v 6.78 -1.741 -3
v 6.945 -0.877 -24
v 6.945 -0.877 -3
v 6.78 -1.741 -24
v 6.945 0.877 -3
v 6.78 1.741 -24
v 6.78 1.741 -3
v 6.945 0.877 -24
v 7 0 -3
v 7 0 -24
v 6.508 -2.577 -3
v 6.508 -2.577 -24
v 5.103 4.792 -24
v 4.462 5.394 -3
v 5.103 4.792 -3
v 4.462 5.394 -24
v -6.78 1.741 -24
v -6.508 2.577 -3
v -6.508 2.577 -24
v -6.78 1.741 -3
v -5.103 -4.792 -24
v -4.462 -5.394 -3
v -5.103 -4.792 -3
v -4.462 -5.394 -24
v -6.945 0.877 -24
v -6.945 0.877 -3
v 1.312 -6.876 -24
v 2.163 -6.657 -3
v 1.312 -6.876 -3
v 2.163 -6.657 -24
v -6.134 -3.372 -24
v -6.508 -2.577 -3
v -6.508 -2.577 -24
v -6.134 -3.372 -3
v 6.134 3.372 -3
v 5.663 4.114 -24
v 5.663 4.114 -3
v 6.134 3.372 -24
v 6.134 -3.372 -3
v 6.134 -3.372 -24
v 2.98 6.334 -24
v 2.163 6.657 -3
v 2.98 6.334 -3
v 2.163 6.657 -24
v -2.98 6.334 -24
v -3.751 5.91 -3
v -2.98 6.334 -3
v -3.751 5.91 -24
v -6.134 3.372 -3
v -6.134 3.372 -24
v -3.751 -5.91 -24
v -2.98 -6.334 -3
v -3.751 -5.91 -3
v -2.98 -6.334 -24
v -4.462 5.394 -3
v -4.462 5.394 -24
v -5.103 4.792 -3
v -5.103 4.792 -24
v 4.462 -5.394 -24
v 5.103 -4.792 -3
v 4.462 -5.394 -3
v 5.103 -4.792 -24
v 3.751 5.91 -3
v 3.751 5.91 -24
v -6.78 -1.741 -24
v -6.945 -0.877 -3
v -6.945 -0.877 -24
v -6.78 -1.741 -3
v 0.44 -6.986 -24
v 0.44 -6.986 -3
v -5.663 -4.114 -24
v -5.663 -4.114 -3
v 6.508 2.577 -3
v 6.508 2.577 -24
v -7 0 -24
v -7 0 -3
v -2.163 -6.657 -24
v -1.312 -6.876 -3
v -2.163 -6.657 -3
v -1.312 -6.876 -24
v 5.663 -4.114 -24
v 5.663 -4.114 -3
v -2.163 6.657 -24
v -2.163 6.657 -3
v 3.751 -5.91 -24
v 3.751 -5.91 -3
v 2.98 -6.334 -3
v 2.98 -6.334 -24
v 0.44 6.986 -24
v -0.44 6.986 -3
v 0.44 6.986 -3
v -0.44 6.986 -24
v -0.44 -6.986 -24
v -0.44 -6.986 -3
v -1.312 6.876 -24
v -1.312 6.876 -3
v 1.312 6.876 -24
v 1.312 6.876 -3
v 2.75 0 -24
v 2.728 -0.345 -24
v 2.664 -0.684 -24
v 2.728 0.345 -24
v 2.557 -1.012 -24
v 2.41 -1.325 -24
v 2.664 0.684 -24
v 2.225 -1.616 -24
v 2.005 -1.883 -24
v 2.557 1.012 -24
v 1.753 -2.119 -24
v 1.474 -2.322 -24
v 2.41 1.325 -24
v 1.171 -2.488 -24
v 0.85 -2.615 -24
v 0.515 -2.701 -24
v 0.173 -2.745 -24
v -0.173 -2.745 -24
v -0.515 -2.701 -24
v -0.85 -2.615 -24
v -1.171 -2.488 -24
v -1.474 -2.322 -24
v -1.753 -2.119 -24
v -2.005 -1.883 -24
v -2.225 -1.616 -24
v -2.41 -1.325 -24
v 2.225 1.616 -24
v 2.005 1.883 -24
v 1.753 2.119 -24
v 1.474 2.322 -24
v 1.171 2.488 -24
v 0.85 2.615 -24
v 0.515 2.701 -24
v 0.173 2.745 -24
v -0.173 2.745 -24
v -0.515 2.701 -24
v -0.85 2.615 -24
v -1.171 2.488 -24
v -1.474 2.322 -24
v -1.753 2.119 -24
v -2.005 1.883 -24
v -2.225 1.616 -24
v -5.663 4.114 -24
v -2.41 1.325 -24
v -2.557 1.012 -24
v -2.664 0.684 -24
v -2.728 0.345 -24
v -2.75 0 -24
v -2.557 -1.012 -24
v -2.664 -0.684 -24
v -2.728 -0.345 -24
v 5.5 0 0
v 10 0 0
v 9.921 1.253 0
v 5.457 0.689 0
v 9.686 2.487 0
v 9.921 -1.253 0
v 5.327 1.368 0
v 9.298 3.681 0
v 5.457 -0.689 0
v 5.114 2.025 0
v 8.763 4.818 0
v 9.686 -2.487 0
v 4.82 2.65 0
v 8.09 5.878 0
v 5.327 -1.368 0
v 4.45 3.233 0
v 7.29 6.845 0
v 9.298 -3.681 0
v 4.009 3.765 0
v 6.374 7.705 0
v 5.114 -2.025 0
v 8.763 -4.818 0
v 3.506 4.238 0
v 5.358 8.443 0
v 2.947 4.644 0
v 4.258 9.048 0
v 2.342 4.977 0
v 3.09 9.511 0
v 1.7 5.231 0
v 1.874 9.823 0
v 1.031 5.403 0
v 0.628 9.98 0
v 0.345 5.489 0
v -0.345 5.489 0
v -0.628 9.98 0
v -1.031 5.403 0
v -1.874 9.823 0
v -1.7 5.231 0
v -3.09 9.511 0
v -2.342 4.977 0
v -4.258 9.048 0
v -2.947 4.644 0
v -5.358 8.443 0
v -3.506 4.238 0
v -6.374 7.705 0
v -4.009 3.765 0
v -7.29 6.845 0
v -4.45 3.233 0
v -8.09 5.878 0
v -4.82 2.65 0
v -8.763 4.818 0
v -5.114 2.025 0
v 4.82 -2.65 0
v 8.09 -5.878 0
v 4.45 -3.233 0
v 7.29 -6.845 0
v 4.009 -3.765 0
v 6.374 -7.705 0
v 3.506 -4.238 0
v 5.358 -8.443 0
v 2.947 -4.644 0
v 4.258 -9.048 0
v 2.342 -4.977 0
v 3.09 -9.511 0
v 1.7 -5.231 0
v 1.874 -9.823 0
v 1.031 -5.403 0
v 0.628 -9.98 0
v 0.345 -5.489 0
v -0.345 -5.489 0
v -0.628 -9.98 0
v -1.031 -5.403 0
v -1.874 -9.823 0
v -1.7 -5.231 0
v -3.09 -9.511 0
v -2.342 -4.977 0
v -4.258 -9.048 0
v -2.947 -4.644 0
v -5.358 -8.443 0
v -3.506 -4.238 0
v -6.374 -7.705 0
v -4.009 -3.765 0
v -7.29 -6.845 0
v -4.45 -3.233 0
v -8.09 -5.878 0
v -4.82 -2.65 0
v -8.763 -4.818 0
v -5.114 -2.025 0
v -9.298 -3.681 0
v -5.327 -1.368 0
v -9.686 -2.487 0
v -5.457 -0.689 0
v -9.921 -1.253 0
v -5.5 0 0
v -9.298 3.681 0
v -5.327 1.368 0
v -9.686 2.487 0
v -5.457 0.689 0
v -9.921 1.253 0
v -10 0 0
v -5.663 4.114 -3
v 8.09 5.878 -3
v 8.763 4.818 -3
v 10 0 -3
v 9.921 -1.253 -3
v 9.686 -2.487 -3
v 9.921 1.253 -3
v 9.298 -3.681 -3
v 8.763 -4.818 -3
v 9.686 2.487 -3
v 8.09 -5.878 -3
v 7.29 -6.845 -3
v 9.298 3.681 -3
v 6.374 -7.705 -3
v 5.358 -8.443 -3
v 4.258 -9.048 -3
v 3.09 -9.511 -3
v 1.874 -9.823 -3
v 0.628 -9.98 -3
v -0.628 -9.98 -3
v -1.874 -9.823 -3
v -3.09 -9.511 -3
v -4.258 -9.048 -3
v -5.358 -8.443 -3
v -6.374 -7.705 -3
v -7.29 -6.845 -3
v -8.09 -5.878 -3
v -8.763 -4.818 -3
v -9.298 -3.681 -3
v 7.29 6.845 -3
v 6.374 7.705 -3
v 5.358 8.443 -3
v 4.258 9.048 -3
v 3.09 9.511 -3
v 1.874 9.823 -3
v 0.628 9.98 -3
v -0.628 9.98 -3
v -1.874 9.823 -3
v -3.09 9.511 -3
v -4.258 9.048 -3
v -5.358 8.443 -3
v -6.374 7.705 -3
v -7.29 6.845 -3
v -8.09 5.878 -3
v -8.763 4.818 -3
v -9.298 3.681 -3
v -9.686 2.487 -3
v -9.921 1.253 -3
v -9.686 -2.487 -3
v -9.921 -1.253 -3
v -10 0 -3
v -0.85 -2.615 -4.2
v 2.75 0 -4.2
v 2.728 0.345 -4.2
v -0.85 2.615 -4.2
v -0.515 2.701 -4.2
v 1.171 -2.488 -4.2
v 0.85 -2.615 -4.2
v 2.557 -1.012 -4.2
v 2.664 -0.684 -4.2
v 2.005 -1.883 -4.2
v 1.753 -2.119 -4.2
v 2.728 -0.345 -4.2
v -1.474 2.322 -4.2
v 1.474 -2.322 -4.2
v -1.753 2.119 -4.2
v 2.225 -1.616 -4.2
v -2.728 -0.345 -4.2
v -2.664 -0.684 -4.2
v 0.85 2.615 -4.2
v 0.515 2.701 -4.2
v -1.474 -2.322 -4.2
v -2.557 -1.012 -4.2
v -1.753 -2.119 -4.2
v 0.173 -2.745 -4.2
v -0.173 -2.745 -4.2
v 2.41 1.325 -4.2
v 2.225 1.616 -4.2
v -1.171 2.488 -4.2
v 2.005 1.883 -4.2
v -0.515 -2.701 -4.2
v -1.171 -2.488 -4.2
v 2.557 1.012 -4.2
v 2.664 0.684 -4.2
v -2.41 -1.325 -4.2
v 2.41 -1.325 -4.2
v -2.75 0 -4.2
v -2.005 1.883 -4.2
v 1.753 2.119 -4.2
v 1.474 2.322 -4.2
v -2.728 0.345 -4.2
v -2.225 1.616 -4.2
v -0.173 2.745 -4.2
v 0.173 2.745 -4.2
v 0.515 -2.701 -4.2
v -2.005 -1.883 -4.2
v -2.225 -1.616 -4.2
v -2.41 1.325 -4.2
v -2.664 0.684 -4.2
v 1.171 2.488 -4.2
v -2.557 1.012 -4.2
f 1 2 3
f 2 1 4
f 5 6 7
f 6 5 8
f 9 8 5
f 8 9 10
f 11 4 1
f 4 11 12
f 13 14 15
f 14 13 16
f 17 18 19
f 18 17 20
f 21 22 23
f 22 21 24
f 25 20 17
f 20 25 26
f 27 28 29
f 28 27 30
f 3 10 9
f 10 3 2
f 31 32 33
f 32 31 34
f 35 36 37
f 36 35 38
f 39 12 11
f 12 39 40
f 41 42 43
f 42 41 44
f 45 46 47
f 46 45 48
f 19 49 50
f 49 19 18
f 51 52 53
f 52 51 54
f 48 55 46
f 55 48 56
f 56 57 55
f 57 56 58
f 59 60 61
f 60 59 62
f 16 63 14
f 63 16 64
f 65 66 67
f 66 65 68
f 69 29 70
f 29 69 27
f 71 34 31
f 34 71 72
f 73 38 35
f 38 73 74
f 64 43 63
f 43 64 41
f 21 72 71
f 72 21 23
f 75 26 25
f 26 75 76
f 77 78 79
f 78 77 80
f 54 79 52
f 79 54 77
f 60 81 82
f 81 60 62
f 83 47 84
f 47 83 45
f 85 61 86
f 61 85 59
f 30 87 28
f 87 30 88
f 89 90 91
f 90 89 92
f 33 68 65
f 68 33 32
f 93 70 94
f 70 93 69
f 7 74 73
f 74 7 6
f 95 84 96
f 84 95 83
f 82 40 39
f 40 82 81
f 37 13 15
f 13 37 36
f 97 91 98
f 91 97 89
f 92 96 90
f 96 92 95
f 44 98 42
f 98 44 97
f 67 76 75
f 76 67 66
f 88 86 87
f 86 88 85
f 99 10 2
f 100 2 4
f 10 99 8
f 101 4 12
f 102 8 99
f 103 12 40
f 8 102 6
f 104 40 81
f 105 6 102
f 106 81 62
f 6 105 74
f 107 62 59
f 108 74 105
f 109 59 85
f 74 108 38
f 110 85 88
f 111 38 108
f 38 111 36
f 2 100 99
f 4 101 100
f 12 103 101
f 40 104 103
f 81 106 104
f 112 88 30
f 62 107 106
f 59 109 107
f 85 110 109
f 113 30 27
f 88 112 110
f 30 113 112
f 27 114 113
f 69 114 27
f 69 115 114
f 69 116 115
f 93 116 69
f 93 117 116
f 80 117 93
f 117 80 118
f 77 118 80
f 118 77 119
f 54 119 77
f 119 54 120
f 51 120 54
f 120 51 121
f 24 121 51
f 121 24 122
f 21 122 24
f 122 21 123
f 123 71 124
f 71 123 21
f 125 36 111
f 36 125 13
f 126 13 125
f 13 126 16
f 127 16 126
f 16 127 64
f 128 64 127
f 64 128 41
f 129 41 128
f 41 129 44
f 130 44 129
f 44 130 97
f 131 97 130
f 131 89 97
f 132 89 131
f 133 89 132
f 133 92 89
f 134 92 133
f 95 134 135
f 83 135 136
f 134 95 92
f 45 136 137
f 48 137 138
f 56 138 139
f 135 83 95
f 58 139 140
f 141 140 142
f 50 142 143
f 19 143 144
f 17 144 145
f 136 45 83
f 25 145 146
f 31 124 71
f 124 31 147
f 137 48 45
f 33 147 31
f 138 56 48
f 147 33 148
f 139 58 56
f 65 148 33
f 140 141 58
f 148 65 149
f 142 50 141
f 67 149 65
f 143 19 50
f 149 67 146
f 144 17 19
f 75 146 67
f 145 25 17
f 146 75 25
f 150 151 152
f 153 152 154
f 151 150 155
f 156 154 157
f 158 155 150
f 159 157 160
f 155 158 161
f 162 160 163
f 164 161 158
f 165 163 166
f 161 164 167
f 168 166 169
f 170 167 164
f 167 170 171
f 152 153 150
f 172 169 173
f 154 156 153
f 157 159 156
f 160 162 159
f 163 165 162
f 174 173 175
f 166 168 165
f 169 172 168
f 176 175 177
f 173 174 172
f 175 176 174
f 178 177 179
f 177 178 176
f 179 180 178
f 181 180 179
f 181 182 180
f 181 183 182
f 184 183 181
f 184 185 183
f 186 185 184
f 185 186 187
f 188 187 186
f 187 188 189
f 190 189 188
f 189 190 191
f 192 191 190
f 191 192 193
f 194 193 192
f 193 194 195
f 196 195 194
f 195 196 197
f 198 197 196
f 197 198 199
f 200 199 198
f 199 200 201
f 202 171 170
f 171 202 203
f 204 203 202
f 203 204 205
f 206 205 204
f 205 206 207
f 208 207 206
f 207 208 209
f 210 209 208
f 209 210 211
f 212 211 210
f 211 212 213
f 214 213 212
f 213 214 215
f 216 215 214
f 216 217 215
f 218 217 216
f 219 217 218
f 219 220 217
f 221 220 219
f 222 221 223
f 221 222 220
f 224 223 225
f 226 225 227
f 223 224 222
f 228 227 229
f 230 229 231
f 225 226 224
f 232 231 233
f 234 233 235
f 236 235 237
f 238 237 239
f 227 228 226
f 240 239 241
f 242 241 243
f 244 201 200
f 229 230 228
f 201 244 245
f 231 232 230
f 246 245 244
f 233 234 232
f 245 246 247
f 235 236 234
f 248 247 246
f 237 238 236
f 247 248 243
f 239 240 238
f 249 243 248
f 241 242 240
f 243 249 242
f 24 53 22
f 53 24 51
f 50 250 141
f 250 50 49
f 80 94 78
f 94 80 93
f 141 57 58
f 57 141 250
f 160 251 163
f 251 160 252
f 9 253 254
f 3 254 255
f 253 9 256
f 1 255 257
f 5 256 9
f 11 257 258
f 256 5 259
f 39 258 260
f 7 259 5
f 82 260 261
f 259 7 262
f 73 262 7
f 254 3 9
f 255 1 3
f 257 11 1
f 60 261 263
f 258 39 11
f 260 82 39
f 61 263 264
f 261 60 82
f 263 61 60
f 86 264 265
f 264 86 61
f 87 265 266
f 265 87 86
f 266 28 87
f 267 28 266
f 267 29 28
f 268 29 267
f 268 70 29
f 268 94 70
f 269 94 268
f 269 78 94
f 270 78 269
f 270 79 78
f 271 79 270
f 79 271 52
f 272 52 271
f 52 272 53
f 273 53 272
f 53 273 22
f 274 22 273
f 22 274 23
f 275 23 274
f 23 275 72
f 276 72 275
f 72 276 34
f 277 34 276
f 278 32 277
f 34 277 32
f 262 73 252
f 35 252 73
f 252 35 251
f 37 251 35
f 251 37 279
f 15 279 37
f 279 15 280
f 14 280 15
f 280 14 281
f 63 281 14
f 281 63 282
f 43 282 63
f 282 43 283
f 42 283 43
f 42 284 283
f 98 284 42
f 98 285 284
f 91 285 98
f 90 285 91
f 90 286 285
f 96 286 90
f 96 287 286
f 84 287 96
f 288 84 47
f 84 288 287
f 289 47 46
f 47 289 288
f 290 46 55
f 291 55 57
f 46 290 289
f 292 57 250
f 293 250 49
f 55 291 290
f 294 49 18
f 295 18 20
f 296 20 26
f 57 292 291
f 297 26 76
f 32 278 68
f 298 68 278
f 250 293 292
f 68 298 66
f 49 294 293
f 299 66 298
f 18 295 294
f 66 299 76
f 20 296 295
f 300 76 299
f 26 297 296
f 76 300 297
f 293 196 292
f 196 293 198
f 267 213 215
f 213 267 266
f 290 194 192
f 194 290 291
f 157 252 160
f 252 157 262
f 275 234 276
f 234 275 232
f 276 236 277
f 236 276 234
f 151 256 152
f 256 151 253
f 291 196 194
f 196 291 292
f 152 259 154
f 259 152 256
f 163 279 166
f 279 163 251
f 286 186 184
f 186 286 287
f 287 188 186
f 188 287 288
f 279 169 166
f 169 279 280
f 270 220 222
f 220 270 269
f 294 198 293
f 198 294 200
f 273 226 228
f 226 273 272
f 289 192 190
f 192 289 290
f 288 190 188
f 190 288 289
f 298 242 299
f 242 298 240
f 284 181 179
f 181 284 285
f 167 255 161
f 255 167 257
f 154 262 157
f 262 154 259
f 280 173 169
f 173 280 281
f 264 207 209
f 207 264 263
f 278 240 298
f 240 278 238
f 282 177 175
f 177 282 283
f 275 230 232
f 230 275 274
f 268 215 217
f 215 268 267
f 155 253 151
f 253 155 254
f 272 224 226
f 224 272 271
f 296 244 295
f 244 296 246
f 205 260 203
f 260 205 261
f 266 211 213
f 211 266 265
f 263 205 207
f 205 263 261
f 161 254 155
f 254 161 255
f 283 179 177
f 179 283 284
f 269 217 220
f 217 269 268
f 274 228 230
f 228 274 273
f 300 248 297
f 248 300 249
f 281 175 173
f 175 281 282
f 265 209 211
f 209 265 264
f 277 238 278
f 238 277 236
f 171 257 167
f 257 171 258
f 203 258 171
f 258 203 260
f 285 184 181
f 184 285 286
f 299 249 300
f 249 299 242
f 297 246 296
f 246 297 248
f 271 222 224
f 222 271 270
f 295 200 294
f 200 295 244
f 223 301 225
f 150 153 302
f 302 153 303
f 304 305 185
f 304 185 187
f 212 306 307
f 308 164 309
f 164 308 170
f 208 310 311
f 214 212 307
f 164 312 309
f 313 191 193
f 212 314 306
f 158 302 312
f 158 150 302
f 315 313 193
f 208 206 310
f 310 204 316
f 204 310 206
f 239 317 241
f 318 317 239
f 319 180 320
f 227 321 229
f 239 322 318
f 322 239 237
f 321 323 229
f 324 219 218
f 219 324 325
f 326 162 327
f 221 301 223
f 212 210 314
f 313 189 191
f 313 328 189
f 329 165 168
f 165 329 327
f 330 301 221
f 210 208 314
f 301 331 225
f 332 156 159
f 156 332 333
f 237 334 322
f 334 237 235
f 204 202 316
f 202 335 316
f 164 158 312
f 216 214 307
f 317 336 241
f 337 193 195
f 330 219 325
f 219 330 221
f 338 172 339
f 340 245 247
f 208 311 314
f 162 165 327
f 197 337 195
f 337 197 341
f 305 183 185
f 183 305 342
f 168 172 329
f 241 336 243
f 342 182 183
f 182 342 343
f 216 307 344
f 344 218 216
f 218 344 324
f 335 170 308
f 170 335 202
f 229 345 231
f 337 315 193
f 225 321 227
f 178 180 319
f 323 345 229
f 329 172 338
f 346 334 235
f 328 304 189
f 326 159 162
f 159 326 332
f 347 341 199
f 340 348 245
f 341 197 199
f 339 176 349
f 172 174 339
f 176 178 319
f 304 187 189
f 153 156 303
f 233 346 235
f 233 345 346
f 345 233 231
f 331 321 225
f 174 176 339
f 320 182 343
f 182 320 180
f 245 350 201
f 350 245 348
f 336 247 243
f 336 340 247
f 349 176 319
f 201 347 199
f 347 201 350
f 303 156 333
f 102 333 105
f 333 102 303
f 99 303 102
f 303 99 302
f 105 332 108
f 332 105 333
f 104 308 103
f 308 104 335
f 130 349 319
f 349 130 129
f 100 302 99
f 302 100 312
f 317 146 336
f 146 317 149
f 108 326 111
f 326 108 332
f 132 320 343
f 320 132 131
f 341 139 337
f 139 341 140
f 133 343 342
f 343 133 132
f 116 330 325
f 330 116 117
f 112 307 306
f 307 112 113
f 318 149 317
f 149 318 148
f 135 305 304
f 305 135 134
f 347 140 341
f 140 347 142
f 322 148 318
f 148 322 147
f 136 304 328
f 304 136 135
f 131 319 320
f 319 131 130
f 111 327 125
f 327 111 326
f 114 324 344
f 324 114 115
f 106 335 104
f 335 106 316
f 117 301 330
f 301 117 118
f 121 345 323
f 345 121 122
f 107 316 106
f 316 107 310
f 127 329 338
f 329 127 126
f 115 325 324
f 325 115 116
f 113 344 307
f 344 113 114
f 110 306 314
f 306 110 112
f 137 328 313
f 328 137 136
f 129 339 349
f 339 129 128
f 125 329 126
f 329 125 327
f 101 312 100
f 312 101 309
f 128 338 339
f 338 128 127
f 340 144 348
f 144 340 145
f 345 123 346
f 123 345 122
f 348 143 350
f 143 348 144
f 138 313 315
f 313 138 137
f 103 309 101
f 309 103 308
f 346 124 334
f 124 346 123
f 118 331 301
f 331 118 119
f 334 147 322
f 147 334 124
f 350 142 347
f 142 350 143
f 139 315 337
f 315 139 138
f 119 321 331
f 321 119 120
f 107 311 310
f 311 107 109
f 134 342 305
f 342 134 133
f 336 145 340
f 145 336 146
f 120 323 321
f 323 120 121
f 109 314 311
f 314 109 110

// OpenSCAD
$fn = 50;


difference() {
	union() {
		translate(v = [0, 0, -24.0000000000]) {
			cylinder(h = 24, r = 7.0000000000);
		}
		translate(v = [0, 0, -3.0000000000]) {
			cylinder(h = 3, r = 10.0000000000);
		}
	}
	union() {
		translate(v = [0, 0, 0]) {
			rotate(a = [0, 0, 0]) {
				difference() {
					union() {
						#translate(v = [0, 0, -24.0000000000]) {
							cylinder(h = 24, r = 2.2500000000);
						}
						#translate(v = [0, 0, -4.2000000000]) {
							cylinder(h = 4.2000000000, r1 = 2.7500000000, r2 = 5.5000000000);
						}
						#translate(v = [0, 0, -24.0000000000]) {
							cylinder(h = 24, r = 2.7500000000);
						}
						#translate(v = [0, 0, -24.0000000000]) {
							cylinder(h = 24, r = 2.2500000000);
						}
					}
					union();
				}
			}
		}
	}
}
